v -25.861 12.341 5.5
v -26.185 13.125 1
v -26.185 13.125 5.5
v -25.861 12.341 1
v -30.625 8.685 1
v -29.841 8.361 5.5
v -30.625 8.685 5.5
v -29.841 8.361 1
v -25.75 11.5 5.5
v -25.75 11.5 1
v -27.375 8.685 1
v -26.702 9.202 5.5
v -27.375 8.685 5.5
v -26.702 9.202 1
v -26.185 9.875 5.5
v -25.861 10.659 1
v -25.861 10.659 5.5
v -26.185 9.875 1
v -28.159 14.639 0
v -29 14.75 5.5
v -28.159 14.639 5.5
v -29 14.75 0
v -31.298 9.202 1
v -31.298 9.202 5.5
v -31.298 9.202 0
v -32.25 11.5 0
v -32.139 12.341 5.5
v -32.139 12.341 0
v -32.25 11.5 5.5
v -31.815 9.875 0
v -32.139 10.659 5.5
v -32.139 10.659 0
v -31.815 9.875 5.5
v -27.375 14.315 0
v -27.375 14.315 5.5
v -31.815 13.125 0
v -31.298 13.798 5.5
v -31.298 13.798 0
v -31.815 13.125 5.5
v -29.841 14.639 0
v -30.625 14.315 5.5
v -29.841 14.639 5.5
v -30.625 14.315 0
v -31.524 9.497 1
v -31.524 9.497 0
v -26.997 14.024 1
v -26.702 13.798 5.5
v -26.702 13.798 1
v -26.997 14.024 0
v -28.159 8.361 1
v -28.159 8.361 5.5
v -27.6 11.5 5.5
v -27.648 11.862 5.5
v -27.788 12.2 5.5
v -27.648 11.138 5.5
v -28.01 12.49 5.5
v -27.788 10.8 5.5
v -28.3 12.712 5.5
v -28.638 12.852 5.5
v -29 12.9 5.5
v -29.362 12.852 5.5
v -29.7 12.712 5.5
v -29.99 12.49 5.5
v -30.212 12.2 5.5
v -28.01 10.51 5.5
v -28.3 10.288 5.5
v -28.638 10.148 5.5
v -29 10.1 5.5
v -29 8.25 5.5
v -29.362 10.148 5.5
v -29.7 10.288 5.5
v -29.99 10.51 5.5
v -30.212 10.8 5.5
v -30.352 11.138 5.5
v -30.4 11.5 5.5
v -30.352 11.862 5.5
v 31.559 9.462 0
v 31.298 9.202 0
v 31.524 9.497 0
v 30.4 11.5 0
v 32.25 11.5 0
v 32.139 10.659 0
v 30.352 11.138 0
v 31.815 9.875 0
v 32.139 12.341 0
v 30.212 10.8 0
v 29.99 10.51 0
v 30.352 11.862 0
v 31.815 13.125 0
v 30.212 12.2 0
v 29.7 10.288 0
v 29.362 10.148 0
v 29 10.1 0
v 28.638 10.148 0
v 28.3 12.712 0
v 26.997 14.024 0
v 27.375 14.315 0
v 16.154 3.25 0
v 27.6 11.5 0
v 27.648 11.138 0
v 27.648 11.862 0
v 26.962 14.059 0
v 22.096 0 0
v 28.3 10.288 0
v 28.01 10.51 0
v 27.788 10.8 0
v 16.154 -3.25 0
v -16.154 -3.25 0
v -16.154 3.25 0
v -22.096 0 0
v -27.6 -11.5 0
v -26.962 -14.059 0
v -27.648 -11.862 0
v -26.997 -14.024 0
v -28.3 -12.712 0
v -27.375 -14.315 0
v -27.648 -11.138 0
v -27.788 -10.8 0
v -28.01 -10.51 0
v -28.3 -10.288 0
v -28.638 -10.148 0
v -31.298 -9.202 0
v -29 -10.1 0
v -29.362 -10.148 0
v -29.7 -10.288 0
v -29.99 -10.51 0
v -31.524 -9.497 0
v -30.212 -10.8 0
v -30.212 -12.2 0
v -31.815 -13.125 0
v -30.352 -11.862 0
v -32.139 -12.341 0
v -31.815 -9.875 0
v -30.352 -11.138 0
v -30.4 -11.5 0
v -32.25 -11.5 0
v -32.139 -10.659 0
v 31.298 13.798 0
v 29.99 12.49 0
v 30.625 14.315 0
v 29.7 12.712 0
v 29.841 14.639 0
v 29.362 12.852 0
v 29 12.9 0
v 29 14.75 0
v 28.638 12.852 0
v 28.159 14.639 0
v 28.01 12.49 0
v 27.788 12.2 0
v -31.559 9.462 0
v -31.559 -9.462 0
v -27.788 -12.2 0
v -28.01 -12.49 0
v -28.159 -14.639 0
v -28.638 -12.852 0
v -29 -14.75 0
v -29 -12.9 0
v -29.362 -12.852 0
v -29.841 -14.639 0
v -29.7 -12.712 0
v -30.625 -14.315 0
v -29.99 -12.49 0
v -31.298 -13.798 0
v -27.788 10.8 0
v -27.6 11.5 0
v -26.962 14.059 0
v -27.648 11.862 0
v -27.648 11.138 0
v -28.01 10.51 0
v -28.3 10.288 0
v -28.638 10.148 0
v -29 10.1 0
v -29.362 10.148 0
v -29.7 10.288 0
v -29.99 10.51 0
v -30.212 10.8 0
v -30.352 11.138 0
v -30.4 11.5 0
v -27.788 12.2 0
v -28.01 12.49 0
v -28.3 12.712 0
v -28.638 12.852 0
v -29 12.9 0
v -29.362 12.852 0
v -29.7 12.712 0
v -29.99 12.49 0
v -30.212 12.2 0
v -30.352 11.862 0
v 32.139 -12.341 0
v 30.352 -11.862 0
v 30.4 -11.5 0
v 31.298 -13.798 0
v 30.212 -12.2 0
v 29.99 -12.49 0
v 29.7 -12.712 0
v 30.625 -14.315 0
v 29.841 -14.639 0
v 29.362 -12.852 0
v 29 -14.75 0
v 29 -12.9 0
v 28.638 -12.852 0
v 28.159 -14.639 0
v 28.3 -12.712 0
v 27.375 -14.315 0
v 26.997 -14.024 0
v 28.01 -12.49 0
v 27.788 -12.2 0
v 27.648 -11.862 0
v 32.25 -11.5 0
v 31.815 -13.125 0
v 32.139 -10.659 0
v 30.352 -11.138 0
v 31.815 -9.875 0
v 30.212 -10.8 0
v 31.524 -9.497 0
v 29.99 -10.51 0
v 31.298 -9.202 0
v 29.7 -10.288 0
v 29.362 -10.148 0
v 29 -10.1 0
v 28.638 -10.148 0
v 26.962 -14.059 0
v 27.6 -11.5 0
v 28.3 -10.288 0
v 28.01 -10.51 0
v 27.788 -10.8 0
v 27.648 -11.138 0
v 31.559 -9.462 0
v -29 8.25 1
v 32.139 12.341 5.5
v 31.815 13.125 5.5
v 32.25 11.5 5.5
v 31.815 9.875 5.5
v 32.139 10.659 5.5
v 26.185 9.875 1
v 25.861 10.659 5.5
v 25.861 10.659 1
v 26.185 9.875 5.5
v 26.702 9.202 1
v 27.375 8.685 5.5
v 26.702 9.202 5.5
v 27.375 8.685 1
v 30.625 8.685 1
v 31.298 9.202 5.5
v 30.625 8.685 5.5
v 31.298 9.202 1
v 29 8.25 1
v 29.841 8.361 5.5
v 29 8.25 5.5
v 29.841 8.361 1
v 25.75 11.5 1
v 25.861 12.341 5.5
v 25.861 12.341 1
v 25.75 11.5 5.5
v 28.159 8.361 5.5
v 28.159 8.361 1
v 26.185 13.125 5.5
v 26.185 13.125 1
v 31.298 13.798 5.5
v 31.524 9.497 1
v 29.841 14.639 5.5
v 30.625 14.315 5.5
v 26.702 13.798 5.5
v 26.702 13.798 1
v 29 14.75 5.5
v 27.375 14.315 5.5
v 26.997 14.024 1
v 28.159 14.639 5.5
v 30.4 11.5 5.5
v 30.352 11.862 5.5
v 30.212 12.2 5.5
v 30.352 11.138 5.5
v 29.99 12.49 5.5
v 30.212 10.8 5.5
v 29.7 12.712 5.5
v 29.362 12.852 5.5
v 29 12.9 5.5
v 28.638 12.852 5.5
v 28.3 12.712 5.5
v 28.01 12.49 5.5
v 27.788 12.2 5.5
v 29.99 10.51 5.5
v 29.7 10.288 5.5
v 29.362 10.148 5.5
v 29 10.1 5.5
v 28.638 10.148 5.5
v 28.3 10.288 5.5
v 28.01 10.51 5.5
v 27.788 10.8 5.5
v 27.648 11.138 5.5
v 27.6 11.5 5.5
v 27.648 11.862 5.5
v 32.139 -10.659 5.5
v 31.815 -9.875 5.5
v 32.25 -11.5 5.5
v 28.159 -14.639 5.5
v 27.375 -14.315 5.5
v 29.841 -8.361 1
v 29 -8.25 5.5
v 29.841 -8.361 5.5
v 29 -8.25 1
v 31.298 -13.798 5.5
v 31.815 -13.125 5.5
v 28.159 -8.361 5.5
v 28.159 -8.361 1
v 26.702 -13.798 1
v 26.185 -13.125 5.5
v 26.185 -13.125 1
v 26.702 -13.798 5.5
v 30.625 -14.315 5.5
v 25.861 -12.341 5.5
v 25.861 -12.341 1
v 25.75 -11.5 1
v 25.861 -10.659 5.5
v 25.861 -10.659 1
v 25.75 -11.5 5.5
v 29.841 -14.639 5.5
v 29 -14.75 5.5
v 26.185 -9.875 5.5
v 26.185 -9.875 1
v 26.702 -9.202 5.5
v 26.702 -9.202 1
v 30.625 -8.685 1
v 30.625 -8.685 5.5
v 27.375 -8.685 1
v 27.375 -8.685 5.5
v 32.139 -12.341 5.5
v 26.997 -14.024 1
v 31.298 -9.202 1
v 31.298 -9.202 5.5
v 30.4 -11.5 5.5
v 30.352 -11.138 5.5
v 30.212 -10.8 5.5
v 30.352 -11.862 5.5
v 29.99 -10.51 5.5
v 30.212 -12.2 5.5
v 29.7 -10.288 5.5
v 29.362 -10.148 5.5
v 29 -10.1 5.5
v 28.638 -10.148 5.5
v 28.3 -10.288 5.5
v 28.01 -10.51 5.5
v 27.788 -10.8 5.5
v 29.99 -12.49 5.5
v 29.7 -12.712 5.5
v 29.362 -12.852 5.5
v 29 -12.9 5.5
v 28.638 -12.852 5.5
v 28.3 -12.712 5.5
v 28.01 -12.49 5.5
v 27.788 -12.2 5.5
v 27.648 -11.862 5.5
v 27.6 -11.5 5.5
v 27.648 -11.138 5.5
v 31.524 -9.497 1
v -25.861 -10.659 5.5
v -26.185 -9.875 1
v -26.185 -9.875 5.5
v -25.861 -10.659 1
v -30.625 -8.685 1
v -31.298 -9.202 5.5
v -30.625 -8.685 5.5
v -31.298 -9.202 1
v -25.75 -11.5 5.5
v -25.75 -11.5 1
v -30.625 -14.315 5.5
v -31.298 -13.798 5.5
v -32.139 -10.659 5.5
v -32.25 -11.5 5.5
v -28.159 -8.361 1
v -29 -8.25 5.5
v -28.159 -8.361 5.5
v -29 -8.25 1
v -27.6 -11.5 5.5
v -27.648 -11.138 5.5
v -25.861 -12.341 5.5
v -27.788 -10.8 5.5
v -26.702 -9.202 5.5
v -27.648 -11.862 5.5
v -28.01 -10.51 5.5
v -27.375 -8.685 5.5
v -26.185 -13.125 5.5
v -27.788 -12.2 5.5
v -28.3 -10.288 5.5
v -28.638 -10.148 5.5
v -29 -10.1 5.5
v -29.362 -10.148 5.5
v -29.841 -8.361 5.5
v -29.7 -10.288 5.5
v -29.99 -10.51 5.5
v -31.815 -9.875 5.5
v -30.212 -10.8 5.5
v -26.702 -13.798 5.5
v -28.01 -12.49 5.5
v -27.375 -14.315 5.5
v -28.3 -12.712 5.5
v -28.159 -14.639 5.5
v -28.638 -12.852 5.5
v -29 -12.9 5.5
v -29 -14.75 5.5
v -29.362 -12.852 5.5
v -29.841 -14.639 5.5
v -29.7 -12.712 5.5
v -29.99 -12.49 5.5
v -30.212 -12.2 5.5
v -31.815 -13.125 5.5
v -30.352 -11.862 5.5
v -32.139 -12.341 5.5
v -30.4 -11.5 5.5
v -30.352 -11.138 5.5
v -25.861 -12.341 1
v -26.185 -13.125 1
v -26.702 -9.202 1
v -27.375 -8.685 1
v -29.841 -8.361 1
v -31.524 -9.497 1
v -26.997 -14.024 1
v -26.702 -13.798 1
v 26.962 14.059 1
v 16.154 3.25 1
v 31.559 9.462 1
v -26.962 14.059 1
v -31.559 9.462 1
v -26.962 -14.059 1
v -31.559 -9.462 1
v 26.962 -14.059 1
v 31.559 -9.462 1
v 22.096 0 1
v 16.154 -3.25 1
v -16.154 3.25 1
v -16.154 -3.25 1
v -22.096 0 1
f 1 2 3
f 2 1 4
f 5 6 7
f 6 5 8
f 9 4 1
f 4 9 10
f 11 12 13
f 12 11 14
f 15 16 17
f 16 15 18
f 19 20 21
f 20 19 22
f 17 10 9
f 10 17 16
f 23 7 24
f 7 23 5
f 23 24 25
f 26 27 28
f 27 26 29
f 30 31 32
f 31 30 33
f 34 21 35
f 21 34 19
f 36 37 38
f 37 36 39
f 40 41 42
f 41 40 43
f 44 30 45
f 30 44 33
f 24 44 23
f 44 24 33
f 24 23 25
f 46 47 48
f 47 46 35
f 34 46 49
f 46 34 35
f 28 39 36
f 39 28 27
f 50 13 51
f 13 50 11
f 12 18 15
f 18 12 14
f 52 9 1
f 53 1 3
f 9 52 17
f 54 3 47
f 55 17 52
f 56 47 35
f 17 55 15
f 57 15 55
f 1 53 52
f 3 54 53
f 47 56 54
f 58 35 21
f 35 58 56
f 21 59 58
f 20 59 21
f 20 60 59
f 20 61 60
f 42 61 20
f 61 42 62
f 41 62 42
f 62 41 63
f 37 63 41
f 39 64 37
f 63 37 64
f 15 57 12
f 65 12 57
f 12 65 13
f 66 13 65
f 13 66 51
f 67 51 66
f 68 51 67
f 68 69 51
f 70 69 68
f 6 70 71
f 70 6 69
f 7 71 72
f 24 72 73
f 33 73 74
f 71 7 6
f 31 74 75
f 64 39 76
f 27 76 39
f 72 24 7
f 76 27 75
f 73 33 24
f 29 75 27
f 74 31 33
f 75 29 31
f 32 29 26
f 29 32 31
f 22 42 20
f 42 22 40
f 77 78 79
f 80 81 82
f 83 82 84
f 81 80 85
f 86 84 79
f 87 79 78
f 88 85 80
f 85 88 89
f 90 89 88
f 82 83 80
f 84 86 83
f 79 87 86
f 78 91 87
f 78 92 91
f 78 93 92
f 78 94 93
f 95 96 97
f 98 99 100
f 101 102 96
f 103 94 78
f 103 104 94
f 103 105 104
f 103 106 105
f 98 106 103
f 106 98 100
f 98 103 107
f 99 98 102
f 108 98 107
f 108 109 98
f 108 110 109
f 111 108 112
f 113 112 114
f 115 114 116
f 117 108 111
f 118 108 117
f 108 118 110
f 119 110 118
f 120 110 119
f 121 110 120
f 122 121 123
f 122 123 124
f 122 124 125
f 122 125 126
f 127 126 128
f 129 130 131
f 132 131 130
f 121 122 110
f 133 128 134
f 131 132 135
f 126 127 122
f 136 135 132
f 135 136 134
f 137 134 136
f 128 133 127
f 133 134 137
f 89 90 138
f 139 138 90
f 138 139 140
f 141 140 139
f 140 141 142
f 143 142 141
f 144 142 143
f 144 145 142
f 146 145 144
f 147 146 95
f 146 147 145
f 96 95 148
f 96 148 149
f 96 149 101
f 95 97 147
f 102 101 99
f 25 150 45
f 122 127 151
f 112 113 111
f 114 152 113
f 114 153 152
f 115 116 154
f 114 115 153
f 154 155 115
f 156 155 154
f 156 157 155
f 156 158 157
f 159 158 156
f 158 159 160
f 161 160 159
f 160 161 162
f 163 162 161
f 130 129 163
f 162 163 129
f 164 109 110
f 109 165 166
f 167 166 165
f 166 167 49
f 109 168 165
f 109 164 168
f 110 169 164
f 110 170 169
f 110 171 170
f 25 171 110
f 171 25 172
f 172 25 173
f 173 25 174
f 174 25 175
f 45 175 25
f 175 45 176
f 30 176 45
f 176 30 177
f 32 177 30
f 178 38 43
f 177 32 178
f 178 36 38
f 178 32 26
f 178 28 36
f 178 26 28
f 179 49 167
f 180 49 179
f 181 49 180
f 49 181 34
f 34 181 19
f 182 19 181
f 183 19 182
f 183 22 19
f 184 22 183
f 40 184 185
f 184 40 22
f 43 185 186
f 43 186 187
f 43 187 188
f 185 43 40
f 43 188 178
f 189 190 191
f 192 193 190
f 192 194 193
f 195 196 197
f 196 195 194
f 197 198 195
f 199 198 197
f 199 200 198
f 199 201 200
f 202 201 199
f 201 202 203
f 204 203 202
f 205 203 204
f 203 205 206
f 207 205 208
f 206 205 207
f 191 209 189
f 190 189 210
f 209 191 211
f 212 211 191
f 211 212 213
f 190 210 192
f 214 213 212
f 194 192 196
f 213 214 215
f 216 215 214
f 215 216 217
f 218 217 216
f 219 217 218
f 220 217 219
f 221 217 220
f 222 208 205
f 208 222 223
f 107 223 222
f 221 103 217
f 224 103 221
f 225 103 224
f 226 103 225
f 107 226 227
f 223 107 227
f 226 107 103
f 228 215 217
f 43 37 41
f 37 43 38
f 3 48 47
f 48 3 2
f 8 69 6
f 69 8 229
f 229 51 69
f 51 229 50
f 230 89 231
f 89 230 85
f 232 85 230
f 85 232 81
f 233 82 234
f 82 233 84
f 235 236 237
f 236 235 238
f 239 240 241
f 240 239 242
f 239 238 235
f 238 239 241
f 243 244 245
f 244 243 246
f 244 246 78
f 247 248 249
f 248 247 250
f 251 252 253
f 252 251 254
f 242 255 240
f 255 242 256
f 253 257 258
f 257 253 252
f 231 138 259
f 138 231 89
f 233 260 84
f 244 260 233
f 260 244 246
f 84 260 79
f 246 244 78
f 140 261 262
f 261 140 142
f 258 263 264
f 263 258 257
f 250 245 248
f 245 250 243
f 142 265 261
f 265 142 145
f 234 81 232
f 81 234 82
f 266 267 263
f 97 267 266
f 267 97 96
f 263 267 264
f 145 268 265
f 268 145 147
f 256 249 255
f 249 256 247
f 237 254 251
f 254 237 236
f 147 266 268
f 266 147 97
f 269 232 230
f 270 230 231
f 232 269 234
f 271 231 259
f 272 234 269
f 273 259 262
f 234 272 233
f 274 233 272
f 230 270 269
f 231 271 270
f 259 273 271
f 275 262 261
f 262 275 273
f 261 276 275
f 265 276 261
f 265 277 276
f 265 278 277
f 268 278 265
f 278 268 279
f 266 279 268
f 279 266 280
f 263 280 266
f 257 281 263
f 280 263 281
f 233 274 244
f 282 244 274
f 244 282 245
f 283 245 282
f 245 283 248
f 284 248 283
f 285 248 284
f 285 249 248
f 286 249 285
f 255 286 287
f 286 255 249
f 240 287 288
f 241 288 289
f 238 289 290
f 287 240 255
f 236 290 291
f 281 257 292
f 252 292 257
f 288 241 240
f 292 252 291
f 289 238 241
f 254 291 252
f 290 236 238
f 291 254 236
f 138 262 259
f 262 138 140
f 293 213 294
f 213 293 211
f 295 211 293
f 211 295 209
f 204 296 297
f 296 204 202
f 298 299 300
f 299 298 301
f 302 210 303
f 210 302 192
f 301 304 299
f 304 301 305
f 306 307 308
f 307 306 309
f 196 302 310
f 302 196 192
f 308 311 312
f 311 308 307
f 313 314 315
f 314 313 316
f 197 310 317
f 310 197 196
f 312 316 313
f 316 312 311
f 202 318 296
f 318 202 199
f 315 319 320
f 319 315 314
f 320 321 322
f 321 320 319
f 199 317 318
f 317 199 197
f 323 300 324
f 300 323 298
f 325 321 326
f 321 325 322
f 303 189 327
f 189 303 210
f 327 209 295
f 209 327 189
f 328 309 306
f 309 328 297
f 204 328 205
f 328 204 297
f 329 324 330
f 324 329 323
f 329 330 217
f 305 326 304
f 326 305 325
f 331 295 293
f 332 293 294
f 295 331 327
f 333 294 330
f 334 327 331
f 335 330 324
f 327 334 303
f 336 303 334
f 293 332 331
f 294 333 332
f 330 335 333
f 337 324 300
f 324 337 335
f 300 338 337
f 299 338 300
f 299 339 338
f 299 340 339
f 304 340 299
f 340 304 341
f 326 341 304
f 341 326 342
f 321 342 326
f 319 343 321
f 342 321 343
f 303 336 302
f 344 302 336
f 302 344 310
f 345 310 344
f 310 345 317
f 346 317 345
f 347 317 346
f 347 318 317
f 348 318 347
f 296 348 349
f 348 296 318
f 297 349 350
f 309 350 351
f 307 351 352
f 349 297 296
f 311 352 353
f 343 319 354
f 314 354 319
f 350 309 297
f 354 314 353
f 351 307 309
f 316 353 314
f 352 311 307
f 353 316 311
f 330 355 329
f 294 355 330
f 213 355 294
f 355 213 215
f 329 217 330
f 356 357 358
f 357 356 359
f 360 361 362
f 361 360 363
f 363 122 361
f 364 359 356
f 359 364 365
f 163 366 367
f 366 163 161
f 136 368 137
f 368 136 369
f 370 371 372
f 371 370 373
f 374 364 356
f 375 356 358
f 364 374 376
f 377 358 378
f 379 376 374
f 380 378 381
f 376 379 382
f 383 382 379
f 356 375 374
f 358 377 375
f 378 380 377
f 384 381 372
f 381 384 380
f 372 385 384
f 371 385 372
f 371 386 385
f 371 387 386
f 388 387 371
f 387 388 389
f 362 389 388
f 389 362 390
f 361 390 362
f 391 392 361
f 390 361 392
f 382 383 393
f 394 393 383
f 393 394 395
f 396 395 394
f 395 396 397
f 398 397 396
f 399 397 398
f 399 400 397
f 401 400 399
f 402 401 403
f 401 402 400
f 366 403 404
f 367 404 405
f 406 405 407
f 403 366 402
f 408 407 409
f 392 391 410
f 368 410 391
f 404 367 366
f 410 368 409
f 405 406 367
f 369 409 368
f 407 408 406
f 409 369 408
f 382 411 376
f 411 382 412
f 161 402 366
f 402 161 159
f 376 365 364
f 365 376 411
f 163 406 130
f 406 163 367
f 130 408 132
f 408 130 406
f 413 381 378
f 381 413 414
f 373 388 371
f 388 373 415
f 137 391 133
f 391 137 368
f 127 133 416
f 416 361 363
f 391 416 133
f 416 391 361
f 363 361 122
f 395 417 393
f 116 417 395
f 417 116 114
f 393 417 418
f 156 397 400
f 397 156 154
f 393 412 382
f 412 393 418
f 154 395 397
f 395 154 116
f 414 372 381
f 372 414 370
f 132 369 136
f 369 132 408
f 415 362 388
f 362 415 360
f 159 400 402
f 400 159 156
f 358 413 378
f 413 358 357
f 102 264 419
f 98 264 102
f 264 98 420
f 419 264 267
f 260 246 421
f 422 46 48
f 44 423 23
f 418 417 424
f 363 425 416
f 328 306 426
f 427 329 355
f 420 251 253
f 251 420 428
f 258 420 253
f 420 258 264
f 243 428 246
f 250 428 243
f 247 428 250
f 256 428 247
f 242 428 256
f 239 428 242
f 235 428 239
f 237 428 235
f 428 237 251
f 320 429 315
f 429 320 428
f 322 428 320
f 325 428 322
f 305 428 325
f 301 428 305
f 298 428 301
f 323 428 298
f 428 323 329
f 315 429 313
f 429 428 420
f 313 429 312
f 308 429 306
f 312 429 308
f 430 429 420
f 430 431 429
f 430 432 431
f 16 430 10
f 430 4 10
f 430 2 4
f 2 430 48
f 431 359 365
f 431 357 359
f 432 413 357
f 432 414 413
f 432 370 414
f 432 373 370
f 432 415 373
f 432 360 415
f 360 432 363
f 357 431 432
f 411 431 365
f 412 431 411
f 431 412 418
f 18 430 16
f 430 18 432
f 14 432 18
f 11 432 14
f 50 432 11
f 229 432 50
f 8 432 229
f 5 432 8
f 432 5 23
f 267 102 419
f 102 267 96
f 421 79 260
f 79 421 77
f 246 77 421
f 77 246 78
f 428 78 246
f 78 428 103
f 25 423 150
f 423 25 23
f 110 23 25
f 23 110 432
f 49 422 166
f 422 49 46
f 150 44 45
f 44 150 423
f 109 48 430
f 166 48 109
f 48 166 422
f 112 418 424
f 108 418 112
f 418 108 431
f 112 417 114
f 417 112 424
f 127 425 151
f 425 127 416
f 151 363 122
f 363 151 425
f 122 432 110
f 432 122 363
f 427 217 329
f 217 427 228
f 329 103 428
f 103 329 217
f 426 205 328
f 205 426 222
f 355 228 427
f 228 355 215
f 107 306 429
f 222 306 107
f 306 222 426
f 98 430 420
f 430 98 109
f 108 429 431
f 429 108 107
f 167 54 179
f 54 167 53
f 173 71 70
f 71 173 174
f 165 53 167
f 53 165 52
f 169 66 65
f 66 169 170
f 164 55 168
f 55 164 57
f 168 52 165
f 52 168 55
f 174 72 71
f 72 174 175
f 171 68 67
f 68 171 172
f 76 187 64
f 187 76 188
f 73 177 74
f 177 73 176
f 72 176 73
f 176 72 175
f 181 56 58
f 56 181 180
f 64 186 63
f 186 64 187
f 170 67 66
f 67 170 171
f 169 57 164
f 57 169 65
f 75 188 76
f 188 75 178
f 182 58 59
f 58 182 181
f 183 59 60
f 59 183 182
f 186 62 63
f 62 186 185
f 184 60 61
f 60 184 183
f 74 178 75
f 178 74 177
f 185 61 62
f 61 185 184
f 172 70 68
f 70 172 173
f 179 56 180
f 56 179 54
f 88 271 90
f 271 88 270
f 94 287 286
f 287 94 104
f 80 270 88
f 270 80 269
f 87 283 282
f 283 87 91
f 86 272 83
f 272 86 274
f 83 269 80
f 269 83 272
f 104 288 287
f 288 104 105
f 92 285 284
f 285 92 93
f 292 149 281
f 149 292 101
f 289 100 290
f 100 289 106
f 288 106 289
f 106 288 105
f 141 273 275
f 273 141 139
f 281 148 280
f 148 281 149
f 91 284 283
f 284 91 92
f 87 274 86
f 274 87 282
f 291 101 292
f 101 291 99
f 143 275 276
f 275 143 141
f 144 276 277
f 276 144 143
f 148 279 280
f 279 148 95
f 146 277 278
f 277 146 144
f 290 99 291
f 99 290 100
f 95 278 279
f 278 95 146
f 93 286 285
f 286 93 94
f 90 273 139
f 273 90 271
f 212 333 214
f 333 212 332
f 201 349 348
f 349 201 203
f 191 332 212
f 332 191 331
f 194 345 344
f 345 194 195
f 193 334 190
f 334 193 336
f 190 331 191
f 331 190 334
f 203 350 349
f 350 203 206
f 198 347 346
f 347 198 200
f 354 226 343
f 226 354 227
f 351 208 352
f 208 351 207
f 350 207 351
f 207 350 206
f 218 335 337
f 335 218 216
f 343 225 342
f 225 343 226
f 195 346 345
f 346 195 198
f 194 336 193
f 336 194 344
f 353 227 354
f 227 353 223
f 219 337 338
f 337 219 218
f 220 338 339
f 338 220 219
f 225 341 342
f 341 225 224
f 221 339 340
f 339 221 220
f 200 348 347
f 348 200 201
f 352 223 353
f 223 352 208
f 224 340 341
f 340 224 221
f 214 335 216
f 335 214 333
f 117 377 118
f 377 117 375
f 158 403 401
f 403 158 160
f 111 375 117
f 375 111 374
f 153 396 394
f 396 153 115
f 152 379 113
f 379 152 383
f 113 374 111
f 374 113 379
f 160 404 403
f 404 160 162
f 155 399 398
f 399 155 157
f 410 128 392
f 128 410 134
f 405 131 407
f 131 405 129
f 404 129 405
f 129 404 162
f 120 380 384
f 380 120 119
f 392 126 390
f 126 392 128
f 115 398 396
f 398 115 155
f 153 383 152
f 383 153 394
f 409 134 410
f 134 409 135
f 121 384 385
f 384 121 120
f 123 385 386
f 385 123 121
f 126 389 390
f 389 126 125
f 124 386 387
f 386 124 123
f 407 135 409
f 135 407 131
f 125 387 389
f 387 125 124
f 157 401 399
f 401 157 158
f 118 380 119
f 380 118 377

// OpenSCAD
$fn=24;
ps = 0.01;

mw = 65;
mh = 30;
mhw = 58;
mhh = 23;

device_mgn = 0.3;

width = 75;
mgn = (width - mhw) / 2.0;

hole = 2.5 + 0.3;
top_hole = 4.5;
hex_size = 6;
hex_nut_height = 2.5;

plate_height = 3.5;
wall_height = 8;
total_height = plate_height + wall_height;

top_margin = mgn - (mw - mhw) / 2;
wall_width = 2.5;

parts_space_depth = 1.5;
parts_space_top_height = 28;
parts_space_bottom_x = 9;

pp = width - mh - top_margin - wall_width;

stopper_width = 3;
stopper_height = 4;
stopper_depth = 1;
bottom_stopper_width = 10;
bottom_stopper_height = 5;
bottom_stopper_x = 40;

usb_hole_x = 14.0;
usb_hole_width = 4.5;
usb_hole_depth = 7;
height = 5.5;

ch = top_hole + 2;
h = 1;
difference() {
    union() {
        //box
        xxx(-mhw/2,mhh/2);
        xxx(mhw/2,mhh/2);
        xxx(mhw/2,-mhh/2);
        xxx(-mhw/2,-mhh/2);

        zzz();
        mirror(v=[1,0,0]) zzz();
        mirror(v=[1,0,0]) mirror(v=[0,1,0]) zzz();
        mirror(v=[0,1,0]) zzz();
        translate([-mhw/2 + mhh/4 + ch/2, -ch/2, 0]){
            linear_extrude(h)
            square([mhw-18,ch]);
        }
    }
    yyy(-mhw/2,mhh/2);
    yyy(mhw/2,mhh/2);
    yyy(mhw/2,-mhh/2);
    yyy(-mhw/2,-mhh/2);
}

module xxx(x,y) {
    difference() {
        translate([x, y, 0]){
            linear_extrude(height)
            circle(d = ch);
        }
    }
}

module yyy(x,y) {
    difference() {
        translate([x, y, -ps]){
            linear_extrude(height + ps * 2)
            circle(d=hole);
        }
    }
}

module zzz(){
    translate([mhw/2-mhh/4, mhh/4, 0]) 
    rotate(a=[0,0,45]){
        linear_extrude(h)
        square([mhh-6,ch], center=true);
    }
}
